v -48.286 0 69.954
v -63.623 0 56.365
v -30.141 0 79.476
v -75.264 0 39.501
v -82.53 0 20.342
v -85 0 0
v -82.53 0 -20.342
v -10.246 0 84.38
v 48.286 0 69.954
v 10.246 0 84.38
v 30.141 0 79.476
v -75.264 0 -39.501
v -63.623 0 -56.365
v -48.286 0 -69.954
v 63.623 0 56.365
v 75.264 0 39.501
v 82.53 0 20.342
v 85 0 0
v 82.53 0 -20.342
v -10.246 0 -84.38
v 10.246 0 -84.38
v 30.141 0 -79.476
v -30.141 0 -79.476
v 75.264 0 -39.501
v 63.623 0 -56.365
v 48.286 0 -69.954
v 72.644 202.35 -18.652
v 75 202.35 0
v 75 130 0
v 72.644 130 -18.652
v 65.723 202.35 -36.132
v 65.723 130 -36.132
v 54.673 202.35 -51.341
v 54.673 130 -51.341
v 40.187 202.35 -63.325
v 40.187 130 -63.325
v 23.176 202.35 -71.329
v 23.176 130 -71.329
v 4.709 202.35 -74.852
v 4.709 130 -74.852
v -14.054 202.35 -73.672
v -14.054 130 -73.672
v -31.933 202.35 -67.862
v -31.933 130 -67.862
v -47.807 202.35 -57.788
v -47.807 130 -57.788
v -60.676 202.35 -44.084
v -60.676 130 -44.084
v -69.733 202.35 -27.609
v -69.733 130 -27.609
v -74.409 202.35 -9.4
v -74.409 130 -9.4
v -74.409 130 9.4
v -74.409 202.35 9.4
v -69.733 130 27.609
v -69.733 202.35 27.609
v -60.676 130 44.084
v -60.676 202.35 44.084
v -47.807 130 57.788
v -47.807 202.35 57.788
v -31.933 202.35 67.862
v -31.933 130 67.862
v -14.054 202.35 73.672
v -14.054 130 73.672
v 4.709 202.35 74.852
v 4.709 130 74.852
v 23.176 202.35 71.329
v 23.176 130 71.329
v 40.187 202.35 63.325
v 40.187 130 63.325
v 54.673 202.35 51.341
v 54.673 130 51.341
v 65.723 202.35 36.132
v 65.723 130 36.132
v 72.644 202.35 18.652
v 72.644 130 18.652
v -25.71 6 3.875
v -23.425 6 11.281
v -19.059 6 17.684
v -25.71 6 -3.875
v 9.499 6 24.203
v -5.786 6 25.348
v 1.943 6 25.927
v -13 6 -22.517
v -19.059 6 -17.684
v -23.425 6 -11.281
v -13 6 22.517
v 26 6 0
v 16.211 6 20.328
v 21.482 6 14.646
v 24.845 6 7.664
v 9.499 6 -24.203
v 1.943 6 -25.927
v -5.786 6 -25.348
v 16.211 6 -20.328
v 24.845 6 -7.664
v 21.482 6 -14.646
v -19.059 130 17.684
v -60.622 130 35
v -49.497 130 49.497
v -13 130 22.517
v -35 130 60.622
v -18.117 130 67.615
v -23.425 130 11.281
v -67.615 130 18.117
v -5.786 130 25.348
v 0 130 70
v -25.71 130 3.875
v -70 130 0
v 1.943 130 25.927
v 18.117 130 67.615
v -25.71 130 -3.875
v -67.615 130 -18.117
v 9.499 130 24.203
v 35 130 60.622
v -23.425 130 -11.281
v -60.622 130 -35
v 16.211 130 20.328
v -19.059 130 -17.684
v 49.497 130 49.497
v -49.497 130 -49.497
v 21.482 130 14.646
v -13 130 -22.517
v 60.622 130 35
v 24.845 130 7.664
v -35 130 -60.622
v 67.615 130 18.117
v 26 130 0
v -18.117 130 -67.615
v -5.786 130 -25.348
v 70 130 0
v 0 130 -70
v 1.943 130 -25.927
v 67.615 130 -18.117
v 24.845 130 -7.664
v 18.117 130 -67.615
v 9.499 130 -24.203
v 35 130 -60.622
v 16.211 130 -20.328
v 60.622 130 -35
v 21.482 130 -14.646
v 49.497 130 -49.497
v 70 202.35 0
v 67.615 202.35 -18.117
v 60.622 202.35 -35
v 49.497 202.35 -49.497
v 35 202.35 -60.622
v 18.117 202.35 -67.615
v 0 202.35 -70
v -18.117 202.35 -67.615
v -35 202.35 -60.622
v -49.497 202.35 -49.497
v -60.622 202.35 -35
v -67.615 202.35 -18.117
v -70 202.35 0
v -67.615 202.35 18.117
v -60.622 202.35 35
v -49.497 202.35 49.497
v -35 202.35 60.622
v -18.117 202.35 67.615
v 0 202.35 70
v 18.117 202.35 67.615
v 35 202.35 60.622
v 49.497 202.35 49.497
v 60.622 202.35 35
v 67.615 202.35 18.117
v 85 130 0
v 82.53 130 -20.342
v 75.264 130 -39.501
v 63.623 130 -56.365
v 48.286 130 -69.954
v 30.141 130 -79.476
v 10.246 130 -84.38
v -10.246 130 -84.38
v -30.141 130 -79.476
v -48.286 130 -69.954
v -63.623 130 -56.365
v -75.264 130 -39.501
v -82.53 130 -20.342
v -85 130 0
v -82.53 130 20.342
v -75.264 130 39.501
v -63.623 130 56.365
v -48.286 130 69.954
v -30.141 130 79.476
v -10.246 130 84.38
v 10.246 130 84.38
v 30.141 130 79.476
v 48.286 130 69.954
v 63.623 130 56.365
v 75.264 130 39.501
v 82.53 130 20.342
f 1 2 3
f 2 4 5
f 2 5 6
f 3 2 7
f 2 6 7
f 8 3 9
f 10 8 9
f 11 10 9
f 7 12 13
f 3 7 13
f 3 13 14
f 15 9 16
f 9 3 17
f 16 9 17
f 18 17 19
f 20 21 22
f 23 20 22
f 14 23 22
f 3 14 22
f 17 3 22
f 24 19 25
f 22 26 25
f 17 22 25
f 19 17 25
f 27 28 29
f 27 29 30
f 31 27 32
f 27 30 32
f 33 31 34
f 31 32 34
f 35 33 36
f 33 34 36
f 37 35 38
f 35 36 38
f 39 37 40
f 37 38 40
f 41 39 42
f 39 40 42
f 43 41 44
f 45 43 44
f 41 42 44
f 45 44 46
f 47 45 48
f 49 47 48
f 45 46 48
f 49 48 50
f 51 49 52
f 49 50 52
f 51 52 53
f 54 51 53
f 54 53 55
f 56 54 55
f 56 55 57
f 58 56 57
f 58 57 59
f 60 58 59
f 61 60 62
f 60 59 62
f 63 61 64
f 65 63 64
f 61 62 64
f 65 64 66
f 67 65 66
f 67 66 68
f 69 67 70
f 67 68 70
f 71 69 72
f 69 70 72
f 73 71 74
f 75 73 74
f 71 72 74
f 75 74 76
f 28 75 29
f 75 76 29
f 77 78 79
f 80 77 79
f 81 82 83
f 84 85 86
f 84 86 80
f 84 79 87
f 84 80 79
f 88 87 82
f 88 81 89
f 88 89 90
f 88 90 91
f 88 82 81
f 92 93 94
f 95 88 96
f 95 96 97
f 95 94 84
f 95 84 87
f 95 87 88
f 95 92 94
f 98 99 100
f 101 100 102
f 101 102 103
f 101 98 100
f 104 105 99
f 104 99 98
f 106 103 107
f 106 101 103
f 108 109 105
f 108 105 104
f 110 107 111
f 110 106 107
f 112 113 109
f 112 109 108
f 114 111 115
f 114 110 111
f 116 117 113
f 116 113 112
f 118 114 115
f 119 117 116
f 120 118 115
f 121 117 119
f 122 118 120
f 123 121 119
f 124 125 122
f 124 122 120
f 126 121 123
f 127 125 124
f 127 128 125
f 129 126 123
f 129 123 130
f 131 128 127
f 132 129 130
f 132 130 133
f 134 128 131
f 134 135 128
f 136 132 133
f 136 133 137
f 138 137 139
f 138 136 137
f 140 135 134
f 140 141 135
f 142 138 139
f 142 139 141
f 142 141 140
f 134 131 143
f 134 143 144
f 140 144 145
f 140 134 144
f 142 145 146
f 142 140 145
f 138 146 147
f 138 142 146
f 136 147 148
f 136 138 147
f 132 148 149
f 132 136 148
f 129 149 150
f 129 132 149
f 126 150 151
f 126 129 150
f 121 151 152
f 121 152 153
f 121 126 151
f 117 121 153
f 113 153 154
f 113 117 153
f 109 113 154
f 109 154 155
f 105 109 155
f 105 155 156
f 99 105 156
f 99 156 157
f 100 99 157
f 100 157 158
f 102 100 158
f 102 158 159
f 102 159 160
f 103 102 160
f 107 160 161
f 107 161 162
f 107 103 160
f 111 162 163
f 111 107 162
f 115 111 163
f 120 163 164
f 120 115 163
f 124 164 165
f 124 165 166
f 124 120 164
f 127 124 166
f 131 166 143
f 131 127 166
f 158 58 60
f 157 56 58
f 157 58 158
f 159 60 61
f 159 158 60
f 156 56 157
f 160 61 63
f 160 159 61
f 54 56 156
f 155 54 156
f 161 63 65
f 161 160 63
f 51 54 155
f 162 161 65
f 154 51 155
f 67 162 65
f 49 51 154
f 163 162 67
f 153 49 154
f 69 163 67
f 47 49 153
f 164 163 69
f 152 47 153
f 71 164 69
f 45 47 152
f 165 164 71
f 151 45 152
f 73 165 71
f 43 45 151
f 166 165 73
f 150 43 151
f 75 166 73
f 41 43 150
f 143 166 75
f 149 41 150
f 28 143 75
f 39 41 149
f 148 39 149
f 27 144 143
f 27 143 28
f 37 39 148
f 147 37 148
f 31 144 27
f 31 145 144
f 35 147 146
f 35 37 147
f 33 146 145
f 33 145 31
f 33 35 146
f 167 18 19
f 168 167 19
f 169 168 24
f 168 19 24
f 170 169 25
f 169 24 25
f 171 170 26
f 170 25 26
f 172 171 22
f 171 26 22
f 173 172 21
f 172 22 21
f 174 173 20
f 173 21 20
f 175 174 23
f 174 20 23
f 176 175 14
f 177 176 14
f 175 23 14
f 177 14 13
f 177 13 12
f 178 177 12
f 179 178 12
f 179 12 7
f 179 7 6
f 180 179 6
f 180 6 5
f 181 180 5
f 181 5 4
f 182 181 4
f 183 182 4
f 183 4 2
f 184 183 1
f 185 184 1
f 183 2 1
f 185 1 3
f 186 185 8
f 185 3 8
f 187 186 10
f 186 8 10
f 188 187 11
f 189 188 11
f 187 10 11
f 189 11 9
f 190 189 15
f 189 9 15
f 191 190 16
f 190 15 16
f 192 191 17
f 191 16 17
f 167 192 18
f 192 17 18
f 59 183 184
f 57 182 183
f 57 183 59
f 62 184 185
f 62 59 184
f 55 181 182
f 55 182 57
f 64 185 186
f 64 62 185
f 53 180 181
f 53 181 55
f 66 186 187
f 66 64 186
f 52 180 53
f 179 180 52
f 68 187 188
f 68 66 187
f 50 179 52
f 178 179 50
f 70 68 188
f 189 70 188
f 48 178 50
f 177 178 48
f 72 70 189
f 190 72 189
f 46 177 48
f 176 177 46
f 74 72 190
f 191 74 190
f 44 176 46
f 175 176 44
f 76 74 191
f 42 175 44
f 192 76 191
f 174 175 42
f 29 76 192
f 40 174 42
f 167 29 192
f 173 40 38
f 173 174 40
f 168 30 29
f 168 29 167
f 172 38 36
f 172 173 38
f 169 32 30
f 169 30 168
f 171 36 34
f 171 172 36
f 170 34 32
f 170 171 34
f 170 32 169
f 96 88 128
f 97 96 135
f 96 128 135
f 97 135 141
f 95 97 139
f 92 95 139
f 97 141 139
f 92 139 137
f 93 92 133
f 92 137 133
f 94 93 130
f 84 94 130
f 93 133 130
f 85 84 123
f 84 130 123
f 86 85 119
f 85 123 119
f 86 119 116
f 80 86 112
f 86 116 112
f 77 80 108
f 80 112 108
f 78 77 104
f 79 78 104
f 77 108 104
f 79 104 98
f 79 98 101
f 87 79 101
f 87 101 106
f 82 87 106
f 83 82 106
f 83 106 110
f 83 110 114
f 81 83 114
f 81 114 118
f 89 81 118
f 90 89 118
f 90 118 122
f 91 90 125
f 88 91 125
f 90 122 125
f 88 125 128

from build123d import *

# Parameters (mm, degrees)
SKETCH1_R           = 85
BOSS_EXTRUDE1_DEPTH = 130
SKETCH2_R           = 26
CUT_EXTRUDE1_DEPTH  = 124
SKETCH3_R           = 75
SKETCH3_R_2         = 70
BOSS_EXTRUDE2_DEPTH = 72.35


with BuildPart() as part:
    # Sketch1 → Boss-Extrude1 (new body)
    with BuildSketch(Plane(origin=(0, 0, 0), x_dir=(1, 0, 0), z_dir=(0, 1, 0))):
        Circle(SKETCH1_R)
    extrude(amount=BOSS_EXTRUDE1_DEPTH)

    # Sketch2 → Cut-Extrude1 (cut)
    with BuildSketch(Plane(origin=(0, 130, 0), x_dir=(1, 0, 0), z_dir=(0, 1, 0))):
        Circle(SKETCH2_R)
    extrude(amount=-CUT_EXTRUDE1_DEPTH, mode=Mode.SUBTRACT)

    # Sketch3 → Boss-Extrude2 (add)
    with BuildSketch(Plane(origin=(0, 130, 0), x_dir=(1, 0, 0), z_dir=(0, 1, 0))):
        Circle(SKETCH3_R)
        Circle(SKETCH3_R_2, mode=Mode.SUBTRACT)
    extrude(amount=BOSS_EXTRUDE2_DEPTH)


solid = part.part
